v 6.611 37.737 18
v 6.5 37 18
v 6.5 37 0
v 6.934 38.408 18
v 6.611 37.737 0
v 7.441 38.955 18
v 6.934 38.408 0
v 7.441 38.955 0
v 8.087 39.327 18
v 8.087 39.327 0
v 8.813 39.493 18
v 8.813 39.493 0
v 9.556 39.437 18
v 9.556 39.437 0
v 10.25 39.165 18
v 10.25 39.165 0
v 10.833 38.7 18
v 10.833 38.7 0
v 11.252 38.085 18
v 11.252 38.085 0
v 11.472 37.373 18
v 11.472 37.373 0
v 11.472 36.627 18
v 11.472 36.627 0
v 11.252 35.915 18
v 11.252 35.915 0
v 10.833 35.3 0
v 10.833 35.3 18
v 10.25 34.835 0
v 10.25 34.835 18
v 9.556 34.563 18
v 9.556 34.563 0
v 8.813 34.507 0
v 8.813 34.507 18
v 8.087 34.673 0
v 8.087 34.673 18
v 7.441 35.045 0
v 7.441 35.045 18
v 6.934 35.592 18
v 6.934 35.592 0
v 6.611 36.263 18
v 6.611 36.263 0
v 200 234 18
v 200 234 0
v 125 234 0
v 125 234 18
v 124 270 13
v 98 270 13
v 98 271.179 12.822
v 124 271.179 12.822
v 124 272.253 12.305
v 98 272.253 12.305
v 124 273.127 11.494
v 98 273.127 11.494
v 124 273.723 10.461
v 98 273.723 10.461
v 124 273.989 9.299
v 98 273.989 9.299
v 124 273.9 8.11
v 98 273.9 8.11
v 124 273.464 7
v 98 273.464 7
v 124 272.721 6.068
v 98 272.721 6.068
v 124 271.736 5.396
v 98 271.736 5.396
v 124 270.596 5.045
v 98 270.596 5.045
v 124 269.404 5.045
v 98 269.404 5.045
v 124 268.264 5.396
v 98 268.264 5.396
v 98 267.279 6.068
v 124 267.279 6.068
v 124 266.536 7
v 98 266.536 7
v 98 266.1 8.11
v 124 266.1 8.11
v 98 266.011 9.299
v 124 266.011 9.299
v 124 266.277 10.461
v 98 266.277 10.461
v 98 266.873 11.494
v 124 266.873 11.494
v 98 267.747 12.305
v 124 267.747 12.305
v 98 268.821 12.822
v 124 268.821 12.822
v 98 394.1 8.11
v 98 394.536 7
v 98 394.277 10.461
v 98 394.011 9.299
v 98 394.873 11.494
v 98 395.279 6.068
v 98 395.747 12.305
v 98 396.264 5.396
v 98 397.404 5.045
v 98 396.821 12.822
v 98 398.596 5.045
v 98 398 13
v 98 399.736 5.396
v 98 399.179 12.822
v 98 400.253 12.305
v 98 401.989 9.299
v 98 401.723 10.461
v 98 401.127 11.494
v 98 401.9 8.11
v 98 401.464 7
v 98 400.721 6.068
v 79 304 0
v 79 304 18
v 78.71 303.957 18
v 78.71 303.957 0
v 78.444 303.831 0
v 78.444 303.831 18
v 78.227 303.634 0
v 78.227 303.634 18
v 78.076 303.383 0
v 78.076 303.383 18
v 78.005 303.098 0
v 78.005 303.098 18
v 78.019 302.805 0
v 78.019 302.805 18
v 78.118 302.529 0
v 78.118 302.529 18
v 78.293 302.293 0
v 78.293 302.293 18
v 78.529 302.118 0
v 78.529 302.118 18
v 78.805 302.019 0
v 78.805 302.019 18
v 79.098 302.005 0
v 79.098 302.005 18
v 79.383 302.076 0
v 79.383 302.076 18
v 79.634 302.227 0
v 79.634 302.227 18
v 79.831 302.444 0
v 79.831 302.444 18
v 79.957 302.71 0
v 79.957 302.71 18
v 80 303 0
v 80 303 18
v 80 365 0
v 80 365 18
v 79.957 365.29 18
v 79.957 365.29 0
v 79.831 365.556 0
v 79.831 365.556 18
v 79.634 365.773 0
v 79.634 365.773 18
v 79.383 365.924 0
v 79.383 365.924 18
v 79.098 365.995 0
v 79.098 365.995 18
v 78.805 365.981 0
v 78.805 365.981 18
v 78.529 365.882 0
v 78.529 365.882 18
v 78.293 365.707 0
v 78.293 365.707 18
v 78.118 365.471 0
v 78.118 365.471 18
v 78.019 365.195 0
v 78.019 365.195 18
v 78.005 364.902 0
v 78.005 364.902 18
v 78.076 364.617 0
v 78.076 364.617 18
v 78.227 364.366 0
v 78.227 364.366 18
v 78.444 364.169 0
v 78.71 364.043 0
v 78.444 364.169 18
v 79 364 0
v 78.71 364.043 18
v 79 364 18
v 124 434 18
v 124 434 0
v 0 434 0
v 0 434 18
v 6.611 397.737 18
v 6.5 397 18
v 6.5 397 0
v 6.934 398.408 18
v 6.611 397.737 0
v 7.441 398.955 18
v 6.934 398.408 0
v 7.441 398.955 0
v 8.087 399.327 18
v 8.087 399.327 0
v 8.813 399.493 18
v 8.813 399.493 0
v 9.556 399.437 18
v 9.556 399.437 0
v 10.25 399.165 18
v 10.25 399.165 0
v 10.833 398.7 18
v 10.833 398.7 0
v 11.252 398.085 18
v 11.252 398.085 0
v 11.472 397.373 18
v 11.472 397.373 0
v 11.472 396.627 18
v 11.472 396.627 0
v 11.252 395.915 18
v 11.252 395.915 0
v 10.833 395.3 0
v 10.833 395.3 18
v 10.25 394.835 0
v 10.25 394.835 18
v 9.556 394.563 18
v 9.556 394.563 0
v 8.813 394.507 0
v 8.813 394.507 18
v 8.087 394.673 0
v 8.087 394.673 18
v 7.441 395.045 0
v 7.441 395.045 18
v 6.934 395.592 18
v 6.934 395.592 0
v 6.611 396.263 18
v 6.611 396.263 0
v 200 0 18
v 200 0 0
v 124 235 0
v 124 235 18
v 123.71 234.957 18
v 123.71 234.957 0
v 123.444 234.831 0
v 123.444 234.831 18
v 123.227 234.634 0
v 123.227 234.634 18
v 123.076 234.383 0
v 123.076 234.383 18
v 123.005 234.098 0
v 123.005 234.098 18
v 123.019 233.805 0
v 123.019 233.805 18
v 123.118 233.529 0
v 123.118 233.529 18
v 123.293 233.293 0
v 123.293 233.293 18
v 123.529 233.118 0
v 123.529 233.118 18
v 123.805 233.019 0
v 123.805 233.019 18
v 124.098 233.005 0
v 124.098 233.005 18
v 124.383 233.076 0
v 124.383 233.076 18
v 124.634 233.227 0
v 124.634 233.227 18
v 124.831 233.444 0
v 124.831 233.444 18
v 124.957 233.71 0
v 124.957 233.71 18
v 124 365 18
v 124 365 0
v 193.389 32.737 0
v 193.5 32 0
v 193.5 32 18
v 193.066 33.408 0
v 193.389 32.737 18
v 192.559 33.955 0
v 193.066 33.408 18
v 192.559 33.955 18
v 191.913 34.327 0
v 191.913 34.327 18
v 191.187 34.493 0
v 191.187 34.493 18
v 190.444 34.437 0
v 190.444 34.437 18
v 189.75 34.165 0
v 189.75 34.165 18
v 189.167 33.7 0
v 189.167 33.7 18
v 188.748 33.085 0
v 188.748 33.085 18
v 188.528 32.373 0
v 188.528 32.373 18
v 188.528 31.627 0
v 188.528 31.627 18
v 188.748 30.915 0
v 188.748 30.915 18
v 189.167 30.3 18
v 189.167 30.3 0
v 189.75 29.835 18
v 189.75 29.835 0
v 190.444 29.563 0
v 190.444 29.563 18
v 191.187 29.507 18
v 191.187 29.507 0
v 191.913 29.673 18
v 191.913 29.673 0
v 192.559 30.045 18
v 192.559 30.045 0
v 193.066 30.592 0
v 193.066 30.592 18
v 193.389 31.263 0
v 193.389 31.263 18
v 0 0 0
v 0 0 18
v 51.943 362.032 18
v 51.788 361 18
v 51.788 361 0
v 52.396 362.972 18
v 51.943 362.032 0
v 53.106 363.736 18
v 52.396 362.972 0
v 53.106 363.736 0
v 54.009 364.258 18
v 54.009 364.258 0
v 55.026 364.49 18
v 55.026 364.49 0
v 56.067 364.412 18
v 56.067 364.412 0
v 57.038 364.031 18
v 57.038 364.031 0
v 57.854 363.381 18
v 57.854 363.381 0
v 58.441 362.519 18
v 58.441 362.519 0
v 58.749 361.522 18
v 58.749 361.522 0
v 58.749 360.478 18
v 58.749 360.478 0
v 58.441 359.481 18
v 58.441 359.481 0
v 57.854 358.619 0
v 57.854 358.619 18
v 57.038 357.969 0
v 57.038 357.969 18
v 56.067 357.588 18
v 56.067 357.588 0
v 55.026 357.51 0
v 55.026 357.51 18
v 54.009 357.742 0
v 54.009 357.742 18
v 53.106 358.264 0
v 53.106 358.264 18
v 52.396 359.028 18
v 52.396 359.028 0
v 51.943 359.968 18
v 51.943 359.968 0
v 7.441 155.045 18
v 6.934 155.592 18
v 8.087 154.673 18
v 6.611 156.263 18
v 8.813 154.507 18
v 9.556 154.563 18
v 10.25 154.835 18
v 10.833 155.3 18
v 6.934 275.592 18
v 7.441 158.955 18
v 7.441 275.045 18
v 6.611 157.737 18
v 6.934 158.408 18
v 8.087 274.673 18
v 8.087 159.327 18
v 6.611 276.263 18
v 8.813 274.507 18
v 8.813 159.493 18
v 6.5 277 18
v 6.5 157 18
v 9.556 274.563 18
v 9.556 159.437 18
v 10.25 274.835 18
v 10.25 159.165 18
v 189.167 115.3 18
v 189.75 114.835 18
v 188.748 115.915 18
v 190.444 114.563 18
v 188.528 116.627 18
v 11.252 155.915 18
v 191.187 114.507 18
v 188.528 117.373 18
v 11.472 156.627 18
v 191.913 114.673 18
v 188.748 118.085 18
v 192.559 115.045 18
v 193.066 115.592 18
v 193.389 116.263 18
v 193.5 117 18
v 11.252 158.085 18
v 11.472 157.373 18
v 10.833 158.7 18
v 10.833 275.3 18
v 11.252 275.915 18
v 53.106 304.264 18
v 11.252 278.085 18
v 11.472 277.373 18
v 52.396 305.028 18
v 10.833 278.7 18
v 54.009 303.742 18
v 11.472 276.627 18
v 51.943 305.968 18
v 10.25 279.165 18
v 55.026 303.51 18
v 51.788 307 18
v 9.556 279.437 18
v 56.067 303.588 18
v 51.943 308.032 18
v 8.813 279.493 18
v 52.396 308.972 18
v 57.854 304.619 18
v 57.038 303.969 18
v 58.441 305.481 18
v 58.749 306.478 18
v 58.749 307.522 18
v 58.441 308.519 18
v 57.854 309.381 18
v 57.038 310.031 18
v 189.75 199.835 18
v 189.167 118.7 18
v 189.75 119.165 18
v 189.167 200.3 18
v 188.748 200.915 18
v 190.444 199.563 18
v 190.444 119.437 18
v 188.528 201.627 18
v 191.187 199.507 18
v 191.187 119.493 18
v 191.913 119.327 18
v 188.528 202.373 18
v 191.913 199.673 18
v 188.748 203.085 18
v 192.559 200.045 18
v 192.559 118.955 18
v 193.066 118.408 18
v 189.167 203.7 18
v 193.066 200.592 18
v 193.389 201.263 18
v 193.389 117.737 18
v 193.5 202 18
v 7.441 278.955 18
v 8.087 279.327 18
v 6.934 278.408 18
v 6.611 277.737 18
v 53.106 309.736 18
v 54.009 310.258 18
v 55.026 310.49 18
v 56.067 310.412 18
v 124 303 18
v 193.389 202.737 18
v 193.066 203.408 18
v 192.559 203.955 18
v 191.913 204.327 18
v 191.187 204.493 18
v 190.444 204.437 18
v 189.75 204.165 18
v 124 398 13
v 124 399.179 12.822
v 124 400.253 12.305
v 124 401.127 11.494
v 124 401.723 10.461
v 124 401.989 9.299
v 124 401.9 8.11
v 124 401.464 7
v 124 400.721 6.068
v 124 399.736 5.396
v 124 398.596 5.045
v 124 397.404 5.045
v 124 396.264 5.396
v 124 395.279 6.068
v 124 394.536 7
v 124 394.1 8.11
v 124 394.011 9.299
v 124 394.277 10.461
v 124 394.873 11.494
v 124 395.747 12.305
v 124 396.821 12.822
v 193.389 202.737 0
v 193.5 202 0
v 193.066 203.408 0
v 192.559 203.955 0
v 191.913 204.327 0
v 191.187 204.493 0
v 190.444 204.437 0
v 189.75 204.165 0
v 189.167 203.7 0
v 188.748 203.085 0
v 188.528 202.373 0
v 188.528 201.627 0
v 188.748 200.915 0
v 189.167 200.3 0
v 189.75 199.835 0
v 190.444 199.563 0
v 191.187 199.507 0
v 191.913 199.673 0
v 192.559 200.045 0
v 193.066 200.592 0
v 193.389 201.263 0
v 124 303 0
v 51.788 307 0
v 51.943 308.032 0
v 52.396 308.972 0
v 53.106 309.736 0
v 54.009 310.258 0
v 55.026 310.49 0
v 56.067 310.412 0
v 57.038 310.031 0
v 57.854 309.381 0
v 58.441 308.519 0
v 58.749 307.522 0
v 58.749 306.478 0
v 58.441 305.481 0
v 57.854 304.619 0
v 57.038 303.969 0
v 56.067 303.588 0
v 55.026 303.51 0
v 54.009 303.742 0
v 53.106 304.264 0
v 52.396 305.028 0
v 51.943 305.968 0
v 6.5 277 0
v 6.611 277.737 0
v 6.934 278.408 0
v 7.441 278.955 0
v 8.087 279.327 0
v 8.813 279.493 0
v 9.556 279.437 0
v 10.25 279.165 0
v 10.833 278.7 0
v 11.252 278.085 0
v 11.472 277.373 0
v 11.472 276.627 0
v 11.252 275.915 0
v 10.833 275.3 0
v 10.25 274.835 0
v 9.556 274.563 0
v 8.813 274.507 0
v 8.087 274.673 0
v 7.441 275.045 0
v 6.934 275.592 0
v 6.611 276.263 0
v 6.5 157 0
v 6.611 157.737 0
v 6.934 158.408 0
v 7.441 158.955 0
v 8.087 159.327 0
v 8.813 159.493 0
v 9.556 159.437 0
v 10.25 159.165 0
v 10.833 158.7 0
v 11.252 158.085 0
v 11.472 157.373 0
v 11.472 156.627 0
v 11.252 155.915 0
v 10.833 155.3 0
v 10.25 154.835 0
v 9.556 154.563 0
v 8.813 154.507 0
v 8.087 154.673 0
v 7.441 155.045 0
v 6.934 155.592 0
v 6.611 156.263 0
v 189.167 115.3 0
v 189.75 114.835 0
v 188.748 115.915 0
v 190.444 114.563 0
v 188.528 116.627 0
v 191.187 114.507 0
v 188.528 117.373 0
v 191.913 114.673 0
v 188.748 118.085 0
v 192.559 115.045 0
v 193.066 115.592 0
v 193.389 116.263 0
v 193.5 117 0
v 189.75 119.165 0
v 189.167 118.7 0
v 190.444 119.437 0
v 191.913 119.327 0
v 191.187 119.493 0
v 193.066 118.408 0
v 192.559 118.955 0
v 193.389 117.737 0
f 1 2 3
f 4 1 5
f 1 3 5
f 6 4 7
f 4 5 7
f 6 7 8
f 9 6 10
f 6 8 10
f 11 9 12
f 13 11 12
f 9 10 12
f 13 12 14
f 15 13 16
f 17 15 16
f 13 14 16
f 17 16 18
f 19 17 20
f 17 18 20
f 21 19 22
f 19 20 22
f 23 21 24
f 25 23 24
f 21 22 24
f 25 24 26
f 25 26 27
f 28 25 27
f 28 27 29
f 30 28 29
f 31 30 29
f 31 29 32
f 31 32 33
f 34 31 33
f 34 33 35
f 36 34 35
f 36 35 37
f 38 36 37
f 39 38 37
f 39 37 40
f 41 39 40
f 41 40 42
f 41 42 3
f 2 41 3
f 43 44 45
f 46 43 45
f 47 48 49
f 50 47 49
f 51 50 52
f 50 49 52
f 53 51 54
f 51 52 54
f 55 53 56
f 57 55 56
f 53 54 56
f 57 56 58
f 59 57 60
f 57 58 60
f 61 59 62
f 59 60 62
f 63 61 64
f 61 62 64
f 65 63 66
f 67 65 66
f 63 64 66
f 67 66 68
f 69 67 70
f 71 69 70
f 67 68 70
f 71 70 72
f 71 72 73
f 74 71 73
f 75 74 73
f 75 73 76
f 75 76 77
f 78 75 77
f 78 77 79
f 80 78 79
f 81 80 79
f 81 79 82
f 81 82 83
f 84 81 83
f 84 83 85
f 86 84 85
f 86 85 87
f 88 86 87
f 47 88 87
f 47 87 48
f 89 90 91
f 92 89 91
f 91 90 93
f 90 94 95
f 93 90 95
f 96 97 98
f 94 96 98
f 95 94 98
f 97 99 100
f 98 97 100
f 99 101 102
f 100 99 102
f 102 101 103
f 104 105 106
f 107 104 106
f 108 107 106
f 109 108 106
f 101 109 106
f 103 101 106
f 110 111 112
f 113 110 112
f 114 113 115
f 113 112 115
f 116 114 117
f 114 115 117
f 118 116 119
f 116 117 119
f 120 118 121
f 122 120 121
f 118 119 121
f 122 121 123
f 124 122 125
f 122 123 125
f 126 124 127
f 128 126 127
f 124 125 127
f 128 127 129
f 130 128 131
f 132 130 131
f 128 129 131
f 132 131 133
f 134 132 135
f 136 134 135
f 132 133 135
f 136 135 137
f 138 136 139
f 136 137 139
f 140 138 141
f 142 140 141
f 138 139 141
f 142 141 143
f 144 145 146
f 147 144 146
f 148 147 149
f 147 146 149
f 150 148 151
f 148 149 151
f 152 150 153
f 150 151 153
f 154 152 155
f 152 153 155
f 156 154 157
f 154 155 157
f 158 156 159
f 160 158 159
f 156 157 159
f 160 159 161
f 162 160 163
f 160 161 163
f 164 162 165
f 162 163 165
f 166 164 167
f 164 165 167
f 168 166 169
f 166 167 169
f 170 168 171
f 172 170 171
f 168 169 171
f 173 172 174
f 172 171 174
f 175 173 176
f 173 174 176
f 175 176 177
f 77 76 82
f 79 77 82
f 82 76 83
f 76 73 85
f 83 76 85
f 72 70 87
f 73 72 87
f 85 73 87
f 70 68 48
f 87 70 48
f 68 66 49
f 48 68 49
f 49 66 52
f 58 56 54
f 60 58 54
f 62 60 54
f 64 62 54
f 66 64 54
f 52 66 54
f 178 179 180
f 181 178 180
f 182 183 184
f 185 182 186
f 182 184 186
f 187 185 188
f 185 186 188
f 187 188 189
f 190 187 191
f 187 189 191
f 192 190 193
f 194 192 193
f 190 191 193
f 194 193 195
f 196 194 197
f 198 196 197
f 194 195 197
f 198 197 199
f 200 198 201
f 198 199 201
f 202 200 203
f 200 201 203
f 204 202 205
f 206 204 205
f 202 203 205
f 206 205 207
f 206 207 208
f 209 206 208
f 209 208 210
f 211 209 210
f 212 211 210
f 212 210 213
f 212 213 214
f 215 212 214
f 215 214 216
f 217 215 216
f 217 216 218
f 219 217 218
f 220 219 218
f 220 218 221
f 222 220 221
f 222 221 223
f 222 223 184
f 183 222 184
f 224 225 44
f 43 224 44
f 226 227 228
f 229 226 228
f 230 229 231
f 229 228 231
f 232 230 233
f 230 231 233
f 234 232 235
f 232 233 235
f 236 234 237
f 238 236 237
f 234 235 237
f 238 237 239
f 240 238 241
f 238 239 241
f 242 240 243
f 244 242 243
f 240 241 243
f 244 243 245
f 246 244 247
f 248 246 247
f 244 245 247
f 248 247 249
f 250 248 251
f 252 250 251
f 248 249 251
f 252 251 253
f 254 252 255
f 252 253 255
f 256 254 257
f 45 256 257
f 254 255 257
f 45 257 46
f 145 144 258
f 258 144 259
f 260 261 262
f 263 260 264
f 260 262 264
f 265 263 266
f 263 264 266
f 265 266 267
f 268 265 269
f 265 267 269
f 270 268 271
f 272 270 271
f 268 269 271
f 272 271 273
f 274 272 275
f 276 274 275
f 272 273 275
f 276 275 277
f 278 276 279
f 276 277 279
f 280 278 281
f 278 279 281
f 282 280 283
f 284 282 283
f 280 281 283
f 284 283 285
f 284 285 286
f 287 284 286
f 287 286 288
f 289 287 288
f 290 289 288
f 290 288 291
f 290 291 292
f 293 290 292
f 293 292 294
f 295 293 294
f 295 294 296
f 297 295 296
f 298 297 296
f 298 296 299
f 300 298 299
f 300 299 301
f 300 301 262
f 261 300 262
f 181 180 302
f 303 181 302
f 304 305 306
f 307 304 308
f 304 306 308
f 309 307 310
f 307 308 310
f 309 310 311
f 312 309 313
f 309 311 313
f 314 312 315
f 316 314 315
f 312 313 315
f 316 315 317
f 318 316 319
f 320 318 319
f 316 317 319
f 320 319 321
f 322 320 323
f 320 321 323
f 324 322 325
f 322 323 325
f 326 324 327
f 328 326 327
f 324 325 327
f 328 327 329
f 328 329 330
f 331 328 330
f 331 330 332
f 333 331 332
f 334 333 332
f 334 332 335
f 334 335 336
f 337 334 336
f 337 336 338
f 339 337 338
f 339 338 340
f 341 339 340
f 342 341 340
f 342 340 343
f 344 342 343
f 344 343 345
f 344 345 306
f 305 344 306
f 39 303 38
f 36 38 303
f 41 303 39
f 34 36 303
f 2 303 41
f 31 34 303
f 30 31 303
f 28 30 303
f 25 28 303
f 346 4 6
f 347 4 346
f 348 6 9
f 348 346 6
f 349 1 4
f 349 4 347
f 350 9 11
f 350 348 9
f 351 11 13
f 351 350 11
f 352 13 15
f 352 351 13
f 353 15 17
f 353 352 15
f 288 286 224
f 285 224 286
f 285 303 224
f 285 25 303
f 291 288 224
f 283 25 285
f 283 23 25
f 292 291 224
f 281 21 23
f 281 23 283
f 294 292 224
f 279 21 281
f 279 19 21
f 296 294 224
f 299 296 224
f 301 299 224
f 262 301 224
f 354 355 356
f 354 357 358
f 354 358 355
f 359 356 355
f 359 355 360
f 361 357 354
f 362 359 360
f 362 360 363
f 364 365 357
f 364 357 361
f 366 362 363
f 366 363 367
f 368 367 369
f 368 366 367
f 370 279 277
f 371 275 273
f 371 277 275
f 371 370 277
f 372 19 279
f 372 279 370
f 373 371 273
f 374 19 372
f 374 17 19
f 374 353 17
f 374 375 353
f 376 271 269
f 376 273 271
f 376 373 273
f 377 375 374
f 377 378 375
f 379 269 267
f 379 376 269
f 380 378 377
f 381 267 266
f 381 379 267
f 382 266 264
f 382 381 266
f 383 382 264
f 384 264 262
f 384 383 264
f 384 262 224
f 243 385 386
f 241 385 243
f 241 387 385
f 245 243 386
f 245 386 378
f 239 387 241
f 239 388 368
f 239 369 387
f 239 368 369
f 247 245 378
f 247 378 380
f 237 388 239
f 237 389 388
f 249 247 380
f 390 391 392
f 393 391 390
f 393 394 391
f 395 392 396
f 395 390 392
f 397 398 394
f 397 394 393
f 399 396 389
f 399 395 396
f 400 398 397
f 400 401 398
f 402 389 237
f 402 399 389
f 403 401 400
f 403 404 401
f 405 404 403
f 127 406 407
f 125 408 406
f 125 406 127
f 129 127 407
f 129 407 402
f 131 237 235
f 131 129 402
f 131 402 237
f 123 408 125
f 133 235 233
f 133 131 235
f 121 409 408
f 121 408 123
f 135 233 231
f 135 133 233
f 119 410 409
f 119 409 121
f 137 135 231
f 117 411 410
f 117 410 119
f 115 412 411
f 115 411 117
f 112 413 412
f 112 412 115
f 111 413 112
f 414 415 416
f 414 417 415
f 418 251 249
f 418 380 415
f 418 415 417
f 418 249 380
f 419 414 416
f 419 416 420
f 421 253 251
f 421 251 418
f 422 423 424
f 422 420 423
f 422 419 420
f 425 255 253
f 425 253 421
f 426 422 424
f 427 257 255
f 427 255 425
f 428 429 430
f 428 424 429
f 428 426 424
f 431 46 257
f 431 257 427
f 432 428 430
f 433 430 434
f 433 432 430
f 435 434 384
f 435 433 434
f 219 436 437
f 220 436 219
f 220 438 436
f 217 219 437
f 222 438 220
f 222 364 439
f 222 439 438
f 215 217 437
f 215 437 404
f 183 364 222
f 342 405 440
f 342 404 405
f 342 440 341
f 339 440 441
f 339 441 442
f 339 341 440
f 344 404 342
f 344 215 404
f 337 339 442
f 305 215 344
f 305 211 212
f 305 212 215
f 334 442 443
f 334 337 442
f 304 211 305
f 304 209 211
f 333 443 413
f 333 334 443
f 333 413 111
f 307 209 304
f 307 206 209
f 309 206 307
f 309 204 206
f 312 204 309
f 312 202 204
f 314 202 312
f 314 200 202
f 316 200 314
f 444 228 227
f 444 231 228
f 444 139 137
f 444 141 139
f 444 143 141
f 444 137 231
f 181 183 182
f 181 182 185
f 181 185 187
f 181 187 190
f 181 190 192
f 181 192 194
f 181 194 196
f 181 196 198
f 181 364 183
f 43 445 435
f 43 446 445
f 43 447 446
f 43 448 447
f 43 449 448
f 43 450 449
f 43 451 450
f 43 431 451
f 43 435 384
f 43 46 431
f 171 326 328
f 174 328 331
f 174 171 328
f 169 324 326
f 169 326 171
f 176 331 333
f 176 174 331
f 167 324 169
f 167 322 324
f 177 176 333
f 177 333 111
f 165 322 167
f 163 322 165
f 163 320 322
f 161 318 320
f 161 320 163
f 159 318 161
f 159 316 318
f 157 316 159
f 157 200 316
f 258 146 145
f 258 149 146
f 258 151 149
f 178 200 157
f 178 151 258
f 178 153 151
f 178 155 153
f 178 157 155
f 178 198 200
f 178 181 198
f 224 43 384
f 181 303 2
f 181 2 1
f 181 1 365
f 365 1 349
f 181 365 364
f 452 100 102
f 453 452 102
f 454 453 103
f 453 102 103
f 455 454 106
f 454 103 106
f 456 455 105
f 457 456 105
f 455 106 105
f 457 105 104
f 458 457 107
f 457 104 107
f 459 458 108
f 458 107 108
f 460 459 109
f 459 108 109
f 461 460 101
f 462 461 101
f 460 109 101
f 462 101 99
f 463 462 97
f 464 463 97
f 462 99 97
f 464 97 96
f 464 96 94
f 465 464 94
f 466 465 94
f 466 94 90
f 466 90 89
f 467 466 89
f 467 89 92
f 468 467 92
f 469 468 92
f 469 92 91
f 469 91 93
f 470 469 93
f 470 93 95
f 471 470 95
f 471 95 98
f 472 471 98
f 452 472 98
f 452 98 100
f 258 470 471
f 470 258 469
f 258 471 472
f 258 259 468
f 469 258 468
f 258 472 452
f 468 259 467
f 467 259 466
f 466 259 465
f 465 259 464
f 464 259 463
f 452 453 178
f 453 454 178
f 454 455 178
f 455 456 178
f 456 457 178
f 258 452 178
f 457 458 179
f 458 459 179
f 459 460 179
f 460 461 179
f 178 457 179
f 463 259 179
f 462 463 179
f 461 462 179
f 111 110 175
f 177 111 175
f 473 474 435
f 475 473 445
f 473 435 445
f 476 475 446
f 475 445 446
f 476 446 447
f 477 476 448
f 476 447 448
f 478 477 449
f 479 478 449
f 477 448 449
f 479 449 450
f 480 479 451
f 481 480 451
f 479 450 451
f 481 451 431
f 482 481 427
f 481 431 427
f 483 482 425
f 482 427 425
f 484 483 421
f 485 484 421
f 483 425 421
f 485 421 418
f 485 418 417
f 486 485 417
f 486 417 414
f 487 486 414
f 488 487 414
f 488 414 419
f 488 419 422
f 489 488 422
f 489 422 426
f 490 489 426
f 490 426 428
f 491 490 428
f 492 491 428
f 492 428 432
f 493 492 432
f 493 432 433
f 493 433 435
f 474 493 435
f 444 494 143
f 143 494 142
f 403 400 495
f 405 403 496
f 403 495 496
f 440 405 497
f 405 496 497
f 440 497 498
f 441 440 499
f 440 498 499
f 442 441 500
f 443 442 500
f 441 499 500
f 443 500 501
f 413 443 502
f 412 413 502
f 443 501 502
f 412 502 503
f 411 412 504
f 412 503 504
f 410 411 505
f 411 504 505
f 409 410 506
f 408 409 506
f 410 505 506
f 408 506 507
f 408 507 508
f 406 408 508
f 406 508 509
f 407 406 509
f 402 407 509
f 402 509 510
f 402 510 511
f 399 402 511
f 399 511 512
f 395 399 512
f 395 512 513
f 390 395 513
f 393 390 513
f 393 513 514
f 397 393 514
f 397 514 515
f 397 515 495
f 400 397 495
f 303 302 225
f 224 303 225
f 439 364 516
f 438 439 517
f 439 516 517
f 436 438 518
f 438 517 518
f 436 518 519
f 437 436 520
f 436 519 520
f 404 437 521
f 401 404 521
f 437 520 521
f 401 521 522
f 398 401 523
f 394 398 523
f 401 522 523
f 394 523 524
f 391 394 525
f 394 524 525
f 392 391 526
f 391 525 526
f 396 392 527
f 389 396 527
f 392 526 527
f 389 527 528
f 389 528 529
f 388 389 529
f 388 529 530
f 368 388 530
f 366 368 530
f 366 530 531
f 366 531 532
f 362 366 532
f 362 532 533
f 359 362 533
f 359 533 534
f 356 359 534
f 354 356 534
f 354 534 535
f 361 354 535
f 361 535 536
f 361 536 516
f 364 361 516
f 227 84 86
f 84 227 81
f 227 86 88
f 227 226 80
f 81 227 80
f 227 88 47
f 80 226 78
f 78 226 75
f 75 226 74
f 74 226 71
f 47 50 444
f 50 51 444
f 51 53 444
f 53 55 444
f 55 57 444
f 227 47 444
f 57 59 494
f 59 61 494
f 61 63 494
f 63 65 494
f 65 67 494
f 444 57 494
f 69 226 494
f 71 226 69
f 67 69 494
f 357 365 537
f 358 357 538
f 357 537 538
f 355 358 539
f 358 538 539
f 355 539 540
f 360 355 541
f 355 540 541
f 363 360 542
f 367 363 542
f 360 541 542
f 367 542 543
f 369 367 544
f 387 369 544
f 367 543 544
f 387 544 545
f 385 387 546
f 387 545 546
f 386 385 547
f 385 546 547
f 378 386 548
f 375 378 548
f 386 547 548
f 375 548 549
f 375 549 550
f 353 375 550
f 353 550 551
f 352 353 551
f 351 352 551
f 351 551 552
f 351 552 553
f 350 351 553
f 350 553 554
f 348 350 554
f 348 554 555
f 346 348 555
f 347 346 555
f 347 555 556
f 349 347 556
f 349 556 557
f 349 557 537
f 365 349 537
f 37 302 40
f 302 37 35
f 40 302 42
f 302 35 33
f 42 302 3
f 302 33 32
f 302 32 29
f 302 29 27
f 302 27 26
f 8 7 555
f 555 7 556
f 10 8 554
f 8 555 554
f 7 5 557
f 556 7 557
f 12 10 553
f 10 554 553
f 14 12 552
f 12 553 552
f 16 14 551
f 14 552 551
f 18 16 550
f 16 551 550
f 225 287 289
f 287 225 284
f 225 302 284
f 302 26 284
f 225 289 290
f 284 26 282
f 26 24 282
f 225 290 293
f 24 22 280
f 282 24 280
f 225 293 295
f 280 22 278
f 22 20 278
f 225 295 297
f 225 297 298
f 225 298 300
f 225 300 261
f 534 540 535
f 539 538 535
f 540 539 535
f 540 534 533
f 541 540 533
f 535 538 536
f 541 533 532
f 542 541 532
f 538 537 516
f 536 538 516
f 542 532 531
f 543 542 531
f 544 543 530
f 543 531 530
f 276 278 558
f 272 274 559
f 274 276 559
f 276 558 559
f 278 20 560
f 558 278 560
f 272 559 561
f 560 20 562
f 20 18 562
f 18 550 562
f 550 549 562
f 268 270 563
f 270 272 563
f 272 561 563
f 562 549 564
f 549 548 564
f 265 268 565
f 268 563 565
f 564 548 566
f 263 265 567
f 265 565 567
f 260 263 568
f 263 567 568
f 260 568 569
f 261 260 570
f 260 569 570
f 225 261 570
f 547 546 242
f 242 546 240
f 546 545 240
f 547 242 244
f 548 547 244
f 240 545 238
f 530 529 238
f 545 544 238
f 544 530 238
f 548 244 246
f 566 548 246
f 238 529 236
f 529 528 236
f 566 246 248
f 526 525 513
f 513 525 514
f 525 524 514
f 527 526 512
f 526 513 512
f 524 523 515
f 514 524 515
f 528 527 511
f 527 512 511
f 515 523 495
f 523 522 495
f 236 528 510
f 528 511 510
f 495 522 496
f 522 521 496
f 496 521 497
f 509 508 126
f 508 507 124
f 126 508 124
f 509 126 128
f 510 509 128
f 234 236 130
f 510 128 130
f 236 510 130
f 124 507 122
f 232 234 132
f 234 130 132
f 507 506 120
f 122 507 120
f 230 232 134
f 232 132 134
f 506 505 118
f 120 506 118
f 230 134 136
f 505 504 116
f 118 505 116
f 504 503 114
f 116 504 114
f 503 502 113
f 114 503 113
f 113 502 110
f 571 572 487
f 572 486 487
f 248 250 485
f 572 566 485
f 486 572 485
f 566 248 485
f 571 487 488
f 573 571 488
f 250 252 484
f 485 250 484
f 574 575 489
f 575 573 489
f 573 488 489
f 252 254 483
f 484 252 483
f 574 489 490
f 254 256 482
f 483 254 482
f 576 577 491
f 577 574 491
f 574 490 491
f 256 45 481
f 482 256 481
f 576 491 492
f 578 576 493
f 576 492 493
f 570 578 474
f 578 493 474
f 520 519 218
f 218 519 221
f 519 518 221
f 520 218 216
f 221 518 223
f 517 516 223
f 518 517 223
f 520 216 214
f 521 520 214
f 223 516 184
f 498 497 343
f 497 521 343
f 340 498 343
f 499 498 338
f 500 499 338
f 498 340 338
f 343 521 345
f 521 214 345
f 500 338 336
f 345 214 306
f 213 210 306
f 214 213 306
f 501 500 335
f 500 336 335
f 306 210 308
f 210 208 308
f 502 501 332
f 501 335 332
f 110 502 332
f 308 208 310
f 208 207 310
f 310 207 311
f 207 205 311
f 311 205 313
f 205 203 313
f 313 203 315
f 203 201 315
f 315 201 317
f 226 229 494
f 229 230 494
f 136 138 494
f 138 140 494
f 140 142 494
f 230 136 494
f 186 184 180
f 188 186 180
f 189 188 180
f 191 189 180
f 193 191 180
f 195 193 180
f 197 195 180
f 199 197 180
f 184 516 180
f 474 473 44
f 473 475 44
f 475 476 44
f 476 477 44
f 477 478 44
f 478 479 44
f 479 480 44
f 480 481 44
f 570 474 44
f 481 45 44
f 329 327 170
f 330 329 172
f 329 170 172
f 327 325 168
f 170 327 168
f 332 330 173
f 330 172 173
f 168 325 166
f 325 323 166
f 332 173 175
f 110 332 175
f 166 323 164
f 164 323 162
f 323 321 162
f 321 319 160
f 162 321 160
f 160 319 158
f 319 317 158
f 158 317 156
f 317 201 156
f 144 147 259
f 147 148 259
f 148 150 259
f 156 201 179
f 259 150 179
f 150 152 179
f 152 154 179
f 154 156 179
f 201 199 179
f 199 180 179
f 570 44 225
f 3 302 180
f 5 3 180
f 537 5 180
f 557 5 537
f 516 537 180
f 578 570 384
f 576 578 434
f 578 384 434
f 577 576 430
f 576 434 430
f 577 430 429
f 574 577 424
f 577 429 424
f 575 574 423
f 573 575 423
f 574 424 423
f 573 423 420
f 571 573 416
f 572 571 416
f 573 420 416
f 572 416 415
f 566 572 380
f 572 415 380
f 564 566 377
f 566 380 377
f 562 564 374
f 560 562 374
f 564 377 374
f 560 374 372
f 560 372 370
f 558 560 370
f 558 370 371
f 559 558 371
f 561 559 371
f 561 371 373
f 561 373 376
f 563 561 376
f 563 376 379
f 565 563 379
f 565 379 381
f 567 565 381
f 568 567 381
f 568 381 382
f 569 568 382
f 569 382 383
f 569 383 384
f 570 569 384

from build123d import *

# Parameters (mm, degrees)
BOSS_EXTRUDE1_DEPTH          = 18
SKETCH2_R                    = 1
CUT_EXTRUDE1_DEPTH           = 18
F_5_0_5_DIAMETER_HOLE1_D     = 5
F_5_0_5_DIAMETER_HOLE2_D     = 5
F_8_0_8_DIAMETER_HOLE1_D     = 8
F_8_0_8_DIAMETER_HOLE1_DEPTH = 26
F_7_0_7_DIAMETER_HOLE1_D     = 7


with BuildPart() as part:
    # Sketch1 → Boss-Extrude1 (new body)
    with BuildSketch(Plane.XY):
        Polygon((200, 234), (124, 234), (124, 303), (79, 303), (79, 365), (124, 365), (124, 434), (0, 434), (0, 0), (200, 0), align=None)
    extrude(amount=BOSS_EXTRUDE1_DEPTH)

    # Sketch2 → Cut-Extrude1 (cut)
    with BuildSketch(Plane.XY.offset(18)):
        with Locations((79, 365)):
            Circle(SKETCH2_R)
        with Locations((79, 303)):
            Circle(SKETCH2_R)
        with Locations((124, 234)):
            Circle(SKETCH2_R)
    extrude(amount=-CUT_EXTRUDE1_DEPTH, mode=Mode.SUBTRACT)

    # Ø5.0 (5) Diameter Hole1 (through all)
    with Locations(Plane.XY.offset(18)):
        with Locations((9, 397), (9, 277), (9, 157), (9, 37)):
            Hole(F_5_0_5_DIAMETER_HOLE1_D / 2)

    # Ø5.0 (5) Diameter Hole2 (through all)
    with Locations(Plane(origin=(0, 0, 0), x_dir=(-1, 0, 0), z_dir=(0, 0, -1))):
        with Locations((-191, 202), (-191, 117), (-191, 32)):
            Hole(F_5_0_5_DIAMETER_HOLE2_D / 2)

    # Ø8.0 (8) Diameter Hole1
    with Locations(Plane(origin=(124, 0, 0), x_dir=(0, 0, -1), z_dir=(1, 0, 0))):
        with Locations((-9, 398), (-9, 270)):
            Hole(F_8_0_8_DIAMETER_HOLE1_D / 2, depth=F_8_0_8_DIAMETER_HOLE1_DEPTH)

    # Ø7.0 (7) Diameter Hole1 (through all)
    with Locations(Plane.XY.offset(18)):
        with Locations((55.287909583, 361), (55.287909583, 307)):
            Hole(F_7_0_7_DIAMETER_HOLE1_D / 2)


solid = part.part
